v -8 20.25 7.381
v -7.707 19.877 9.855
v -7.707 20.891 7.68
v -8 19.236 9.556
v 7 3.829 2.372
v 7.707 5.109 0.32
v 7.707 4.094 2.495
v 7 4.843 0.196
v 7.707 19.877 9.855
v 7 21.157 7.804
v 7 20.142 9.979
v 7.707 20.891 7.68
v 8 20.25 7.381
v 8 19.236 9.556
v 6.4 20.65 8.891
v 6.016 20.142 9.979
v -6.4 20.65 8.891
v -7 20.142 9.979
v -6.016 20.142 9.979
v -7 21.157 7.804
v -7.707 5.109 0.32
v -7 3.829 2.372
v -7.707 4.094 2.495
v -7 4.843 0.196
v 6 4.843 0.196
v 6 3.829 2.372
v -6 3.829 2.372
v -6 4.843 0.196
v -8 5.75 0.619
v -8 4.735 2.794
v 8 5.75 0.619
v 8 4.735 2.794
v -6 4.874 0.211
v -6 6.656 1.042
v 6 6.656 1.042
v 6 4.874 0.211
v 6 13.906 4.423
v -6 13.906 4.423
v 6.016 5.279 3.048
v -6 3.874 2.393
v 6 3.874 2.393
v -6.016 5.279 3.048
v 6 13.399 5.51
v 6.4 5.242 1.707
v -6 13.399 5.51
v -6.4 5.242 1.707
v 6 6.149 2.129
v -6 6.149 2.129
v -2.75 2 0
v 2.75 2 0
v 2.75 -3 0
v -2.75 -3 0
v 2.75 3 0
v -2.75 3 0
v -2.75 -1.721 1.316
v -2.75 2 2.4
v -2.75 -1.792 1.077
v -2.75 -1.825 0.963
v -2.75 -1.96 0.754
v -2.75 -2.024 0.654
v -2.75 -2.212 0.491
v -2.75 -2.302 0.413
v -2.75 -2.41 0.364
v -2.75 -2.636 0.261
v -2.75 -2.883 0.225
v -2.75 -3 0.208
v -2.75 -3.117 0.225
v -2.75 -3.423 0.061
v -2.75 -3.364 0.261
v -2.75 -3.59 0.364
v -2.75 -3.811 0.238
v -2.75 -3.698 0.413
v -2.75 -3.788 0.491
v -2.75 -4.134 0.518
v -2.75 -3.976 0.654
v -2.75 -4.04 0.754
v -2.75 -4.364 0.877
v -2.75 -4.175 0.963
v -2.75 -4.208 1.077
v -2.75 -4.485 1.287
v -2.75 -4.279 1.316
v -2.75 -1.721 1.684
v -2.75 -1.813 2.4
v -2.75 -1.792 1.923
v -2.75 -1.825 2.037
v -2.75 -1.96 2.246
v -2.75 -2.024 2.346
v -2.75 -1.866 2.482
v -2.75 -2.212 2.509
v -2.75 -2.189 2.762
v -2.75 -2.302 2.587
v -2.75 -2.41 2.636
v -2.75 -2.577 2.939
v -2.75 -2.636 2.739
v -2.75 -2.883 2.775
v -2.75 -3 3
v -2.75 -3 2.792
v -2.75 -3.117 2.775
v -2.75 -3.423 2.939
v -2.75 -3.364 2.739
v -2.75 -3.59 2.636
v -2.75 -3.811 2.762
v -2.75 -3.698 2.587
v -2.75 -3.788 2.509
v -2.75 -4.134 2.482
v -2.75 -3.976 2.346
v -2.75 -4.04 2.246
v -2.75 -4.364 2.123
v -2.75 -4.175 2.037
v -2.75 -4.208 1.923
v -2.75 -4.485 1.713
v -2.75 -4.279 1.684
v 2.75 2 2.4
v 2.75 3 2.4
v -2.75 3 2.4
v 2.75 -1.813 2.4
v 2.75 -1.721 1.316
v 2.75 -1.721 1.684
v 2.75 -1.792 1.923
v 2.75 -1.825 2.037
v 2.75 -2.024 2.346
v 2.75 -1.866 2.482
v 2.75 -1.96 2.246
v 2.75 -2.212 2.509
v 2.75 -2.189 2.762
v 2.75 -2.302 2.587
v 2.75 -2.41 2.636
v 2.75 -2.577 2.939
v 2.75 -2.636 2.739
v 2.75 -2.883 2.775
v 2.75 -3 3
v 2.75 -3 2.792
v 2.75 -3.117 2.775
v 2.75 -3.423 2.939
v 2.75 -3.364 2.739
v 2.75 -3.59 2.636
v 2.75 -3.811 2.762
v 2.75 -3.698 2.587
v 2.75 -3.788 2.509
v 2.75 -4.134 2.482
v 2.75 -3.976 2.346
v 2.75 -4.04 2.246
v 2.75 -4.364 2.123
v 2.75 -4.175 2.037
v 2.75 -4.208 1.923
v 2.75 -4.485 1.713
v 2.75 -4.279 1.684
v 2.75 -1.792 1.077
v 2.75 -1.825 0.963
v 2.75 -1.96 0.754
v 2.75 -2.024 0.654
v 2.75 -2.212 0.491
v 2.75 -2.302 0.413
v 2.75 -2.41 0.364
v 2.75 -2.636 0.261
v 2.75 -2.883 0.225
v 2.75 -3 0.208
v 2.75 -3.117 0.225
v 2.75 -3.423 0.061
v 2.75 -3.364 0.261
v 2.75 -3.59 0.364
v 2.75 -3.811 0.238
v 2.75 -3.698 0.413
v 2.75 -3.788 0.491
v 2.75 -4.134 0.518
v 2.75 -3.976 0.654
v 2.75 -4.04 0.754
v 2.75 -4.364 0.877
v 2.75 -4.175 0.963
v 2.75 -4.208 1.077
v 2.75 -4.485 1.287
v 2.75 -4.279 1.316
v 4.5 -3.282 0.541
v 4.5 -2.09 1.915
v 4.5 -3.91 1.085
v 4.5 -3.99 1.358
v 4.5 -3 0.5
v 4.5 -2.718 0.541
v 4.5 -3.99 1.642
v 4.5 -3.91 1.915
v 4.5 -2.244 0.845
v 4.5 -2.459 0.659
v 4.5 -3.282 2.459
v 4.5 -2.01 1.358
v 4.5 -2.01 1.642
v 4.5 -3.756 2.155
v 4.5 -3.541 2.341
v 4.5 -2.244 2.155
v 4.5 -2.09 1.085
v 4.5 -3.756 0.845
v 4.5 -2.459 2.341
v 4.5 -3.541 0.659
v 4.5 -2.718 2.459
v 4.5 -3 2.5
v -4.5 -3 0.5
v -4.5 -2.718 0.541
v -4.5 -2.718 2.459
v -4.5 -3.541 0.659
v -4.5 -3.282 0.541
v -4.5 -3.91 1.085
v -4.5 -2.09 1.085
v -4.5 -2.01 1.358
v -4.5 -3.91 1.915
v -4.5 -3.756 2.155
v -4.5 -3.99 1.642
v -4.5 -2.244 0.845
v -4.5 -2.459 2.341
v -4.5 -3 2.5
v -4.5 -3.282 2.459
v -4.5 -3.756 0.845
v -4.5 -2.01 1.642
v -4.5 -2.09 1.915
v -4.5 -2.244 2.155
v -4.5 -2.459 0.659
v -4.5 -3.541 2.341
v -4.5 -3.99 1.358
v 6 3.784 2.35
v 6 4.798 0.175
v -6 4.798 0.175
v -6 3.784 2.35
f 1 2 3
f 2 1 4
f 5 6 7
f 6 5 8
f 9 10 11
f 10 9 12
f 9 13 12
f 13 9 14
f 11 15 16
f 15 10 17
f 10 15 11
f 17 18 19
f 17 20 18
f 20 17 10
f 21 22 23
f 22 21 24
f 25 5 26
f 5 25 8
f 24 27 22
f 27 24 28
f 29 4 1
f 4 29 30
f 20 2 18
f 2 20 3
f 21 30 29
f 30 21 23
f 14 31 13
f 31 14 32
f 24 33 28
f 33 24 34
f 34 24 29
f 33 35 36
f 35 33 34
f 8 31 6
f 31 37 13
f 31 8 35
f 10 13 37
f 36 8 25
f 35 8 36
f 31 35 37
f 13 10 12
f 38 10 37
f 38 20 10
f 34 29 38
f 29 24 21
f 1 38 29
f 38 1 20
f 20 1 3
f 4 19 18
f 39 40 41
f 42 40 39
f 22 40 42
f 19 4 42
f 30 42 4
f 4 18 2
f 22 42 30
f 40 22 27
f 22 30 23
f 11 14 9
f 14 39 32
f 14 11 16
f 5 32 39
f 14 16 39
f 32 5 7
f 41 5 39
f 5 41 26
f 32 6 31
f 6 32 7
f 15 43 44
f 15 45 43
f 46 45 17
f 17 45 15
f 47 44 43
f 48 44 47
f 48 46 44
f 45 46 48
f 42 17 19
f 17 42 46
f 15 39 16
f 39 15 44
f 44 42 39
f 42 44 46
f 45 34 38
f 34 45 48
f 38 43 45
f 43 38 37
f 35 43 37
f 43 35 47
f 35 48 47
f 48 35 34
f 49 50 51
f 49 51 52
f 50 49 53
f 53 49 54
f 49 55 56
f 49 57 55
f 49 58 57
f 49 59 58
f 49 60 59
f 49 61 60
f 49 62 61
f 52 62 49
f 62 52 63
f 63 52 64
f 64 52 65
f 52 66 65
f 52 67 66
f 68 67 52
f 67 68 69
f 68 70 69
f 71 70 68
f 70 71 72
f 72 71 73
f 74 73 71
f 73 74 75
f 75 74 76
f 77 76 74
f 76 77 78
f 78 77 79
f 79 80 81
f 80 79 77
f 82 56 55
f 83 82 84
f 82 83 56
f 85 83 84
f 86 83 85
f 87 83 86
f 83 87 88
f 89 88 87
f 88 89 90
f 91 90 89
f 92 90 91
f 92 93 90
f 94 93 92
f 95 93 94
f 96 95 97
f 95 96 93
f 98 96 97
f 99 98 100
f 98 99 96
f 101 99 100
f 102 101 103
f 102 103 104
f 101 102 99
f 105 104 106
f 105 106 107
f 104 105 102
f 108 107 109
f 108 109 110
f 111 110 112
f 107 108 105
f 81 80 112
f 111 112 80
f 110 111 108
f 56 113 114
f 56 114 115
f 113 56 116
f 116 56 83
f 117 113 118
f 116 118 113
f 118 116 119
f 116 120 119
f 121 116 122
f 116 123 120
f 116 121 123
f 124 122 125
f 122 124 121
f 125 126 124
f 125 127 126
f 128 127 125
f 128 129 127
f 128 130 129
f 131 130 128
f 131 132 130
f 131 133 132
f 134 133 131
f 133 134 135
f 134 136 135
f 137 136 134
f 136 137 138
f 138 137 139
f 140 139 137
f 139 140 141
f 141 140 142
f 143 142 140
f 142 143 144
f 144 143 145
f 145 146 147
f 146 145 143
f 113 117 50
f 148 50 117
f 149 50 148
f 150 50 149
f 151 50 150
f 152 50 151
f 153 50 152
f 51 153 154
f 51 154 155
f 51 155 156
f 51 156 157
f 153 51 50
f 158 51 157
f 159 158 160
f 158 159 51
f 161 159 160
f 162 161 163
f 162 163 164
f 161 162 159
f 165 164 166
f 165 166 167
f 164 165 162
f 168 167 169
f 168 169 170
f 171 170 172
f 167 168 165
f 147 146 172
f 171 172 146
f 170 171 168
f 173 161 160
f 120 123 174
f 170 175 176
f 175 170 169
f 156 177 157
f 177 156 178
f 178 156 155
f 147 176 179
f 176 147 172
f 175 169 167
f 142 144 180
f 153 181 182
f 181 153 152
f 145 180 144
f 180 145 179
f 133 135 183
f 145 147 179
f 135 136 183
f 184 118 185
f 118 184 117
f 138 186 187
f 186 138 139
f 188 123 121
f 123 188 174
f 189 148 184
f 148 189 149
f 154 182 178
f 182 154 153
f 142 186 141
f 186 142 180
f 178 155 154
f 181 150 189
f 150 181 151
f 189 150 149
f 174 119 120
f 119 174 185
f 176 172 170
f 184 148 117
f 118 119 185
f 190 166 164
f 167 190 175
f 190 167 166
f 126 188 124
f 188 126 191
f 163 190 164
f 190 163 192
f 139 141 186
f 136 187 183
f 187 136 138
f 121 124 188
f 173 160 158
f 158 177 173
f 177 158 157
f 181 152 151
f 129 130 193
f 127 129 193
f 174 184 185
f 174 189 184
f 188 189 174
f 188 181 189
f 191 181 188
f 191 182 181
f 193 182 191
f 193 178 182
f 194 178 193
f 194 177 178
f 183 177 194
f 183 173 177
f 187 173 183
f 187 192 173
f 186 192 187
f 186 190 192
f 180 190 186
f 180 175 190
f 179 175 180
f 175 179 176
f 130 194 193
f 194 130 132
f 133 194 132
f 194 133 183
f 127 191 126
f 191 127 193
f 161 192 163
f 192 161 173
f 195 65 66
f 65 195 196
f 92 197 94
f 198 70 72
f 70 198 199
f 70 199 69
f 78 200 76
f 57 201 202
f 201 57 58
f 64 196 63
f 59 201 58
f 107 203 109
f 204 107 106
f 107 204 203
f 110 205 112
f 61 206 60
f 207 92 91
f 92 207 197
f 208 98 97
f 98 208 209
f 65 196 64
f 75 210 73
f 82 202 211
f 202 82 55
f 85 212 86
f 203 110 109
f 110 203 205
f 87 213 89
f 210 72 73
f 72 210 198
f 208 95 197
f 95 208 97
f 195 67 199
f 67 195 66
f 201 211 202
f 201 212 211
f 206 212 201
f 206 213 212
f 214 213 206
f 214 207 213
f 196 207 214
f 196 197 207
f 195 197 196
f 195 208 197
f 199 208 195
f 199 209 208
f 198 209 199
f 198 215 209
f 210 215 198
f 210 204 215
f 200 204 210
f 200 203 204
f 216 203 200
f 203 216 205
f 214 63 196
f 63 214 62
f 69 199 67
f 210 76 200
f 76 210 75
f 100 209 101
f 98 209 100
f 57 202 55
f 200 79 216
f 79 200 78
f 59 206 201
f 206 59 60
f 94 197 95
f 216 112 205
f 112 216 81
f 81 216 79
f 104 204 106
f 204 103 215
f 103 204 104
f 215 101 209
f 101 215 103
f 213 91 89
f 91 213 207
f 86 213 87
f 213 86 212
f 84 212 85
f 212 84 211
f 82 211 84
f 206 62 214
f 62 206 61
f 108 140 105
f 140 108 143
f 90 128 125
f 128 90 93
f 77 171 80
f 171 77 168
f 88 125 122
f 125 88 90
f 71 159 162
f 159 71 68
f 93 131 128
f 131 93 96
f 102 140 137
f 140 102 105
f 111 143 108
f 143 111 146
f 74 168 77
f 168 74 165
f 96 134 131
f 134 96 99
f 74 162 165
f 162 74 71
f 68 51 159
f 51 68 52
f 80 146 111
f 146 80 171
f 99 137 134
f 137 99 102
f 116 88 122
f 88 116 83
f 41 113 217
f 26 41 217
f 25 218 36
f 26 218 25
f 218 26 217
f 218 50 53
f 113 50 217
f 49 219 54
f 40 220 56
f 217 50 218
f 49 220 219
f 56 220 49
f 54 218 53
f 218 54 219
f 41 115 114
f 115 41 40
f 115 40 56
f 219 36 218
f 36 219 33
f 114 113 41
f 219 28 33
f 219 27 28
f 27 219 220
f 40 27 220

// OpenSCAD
// BB4g hinge parts for the led tapes

//pt1=[ [0,0]

           
            translate([0,13,4]) color("red"){
                rotate([25,0,0]){
                difference(){
                    linear_extrude(height=2.4,scale=1)
                    offset(r=1,$fn=8)
                    square(size=[14,16],center=true);
                    
                    // main slot for tape
                    translate([0,2,1.2])
                    linear_extrude(height=2,scale=0.9)
                    square(size=[12.8,20],center=true);

                    // cut for wires
                    translate([0,-3,-1])
                    linear_extrude(height=3,scale=1)
                    square(size=[12,8],center=true);
                }
            }
            }
            
            linear_extrude(height=2.4,scale=1)
            square(size=[5.5,6],center=true);
        
            translate([3,-3,1.5]) rotate([0,90,0])
            cylinder(r1=1.5,r2=1.0,h=3,center=true,$fn=22);

            translate([-3,-3,1.5]) rotate([0,90,0])
            cylinder(r1=1.0,r2=1.5,h=3,center=true,$fn=22);

            translate([0,-3,1.5]) rotate([0,90,0])
            cylinder(r=1.5,h=5.5,center=true,$fn=22);

            hull(){
            // landing on hinge 
            translate([0,2.5,0]) color("cyan")
            linear_extrude(height=2.4,scale=1)
            square(size=[5.5,1],center=true);
            // landing on tab
            translate([0,13,4]) color("pink"){
                rotate([25,0,0]){
                    translate([0,-9,0])
                    linear_extrude(height=2.4,scale=1)
                    square(size=[12,0.1],center=true);
                }
            }
            
        }
